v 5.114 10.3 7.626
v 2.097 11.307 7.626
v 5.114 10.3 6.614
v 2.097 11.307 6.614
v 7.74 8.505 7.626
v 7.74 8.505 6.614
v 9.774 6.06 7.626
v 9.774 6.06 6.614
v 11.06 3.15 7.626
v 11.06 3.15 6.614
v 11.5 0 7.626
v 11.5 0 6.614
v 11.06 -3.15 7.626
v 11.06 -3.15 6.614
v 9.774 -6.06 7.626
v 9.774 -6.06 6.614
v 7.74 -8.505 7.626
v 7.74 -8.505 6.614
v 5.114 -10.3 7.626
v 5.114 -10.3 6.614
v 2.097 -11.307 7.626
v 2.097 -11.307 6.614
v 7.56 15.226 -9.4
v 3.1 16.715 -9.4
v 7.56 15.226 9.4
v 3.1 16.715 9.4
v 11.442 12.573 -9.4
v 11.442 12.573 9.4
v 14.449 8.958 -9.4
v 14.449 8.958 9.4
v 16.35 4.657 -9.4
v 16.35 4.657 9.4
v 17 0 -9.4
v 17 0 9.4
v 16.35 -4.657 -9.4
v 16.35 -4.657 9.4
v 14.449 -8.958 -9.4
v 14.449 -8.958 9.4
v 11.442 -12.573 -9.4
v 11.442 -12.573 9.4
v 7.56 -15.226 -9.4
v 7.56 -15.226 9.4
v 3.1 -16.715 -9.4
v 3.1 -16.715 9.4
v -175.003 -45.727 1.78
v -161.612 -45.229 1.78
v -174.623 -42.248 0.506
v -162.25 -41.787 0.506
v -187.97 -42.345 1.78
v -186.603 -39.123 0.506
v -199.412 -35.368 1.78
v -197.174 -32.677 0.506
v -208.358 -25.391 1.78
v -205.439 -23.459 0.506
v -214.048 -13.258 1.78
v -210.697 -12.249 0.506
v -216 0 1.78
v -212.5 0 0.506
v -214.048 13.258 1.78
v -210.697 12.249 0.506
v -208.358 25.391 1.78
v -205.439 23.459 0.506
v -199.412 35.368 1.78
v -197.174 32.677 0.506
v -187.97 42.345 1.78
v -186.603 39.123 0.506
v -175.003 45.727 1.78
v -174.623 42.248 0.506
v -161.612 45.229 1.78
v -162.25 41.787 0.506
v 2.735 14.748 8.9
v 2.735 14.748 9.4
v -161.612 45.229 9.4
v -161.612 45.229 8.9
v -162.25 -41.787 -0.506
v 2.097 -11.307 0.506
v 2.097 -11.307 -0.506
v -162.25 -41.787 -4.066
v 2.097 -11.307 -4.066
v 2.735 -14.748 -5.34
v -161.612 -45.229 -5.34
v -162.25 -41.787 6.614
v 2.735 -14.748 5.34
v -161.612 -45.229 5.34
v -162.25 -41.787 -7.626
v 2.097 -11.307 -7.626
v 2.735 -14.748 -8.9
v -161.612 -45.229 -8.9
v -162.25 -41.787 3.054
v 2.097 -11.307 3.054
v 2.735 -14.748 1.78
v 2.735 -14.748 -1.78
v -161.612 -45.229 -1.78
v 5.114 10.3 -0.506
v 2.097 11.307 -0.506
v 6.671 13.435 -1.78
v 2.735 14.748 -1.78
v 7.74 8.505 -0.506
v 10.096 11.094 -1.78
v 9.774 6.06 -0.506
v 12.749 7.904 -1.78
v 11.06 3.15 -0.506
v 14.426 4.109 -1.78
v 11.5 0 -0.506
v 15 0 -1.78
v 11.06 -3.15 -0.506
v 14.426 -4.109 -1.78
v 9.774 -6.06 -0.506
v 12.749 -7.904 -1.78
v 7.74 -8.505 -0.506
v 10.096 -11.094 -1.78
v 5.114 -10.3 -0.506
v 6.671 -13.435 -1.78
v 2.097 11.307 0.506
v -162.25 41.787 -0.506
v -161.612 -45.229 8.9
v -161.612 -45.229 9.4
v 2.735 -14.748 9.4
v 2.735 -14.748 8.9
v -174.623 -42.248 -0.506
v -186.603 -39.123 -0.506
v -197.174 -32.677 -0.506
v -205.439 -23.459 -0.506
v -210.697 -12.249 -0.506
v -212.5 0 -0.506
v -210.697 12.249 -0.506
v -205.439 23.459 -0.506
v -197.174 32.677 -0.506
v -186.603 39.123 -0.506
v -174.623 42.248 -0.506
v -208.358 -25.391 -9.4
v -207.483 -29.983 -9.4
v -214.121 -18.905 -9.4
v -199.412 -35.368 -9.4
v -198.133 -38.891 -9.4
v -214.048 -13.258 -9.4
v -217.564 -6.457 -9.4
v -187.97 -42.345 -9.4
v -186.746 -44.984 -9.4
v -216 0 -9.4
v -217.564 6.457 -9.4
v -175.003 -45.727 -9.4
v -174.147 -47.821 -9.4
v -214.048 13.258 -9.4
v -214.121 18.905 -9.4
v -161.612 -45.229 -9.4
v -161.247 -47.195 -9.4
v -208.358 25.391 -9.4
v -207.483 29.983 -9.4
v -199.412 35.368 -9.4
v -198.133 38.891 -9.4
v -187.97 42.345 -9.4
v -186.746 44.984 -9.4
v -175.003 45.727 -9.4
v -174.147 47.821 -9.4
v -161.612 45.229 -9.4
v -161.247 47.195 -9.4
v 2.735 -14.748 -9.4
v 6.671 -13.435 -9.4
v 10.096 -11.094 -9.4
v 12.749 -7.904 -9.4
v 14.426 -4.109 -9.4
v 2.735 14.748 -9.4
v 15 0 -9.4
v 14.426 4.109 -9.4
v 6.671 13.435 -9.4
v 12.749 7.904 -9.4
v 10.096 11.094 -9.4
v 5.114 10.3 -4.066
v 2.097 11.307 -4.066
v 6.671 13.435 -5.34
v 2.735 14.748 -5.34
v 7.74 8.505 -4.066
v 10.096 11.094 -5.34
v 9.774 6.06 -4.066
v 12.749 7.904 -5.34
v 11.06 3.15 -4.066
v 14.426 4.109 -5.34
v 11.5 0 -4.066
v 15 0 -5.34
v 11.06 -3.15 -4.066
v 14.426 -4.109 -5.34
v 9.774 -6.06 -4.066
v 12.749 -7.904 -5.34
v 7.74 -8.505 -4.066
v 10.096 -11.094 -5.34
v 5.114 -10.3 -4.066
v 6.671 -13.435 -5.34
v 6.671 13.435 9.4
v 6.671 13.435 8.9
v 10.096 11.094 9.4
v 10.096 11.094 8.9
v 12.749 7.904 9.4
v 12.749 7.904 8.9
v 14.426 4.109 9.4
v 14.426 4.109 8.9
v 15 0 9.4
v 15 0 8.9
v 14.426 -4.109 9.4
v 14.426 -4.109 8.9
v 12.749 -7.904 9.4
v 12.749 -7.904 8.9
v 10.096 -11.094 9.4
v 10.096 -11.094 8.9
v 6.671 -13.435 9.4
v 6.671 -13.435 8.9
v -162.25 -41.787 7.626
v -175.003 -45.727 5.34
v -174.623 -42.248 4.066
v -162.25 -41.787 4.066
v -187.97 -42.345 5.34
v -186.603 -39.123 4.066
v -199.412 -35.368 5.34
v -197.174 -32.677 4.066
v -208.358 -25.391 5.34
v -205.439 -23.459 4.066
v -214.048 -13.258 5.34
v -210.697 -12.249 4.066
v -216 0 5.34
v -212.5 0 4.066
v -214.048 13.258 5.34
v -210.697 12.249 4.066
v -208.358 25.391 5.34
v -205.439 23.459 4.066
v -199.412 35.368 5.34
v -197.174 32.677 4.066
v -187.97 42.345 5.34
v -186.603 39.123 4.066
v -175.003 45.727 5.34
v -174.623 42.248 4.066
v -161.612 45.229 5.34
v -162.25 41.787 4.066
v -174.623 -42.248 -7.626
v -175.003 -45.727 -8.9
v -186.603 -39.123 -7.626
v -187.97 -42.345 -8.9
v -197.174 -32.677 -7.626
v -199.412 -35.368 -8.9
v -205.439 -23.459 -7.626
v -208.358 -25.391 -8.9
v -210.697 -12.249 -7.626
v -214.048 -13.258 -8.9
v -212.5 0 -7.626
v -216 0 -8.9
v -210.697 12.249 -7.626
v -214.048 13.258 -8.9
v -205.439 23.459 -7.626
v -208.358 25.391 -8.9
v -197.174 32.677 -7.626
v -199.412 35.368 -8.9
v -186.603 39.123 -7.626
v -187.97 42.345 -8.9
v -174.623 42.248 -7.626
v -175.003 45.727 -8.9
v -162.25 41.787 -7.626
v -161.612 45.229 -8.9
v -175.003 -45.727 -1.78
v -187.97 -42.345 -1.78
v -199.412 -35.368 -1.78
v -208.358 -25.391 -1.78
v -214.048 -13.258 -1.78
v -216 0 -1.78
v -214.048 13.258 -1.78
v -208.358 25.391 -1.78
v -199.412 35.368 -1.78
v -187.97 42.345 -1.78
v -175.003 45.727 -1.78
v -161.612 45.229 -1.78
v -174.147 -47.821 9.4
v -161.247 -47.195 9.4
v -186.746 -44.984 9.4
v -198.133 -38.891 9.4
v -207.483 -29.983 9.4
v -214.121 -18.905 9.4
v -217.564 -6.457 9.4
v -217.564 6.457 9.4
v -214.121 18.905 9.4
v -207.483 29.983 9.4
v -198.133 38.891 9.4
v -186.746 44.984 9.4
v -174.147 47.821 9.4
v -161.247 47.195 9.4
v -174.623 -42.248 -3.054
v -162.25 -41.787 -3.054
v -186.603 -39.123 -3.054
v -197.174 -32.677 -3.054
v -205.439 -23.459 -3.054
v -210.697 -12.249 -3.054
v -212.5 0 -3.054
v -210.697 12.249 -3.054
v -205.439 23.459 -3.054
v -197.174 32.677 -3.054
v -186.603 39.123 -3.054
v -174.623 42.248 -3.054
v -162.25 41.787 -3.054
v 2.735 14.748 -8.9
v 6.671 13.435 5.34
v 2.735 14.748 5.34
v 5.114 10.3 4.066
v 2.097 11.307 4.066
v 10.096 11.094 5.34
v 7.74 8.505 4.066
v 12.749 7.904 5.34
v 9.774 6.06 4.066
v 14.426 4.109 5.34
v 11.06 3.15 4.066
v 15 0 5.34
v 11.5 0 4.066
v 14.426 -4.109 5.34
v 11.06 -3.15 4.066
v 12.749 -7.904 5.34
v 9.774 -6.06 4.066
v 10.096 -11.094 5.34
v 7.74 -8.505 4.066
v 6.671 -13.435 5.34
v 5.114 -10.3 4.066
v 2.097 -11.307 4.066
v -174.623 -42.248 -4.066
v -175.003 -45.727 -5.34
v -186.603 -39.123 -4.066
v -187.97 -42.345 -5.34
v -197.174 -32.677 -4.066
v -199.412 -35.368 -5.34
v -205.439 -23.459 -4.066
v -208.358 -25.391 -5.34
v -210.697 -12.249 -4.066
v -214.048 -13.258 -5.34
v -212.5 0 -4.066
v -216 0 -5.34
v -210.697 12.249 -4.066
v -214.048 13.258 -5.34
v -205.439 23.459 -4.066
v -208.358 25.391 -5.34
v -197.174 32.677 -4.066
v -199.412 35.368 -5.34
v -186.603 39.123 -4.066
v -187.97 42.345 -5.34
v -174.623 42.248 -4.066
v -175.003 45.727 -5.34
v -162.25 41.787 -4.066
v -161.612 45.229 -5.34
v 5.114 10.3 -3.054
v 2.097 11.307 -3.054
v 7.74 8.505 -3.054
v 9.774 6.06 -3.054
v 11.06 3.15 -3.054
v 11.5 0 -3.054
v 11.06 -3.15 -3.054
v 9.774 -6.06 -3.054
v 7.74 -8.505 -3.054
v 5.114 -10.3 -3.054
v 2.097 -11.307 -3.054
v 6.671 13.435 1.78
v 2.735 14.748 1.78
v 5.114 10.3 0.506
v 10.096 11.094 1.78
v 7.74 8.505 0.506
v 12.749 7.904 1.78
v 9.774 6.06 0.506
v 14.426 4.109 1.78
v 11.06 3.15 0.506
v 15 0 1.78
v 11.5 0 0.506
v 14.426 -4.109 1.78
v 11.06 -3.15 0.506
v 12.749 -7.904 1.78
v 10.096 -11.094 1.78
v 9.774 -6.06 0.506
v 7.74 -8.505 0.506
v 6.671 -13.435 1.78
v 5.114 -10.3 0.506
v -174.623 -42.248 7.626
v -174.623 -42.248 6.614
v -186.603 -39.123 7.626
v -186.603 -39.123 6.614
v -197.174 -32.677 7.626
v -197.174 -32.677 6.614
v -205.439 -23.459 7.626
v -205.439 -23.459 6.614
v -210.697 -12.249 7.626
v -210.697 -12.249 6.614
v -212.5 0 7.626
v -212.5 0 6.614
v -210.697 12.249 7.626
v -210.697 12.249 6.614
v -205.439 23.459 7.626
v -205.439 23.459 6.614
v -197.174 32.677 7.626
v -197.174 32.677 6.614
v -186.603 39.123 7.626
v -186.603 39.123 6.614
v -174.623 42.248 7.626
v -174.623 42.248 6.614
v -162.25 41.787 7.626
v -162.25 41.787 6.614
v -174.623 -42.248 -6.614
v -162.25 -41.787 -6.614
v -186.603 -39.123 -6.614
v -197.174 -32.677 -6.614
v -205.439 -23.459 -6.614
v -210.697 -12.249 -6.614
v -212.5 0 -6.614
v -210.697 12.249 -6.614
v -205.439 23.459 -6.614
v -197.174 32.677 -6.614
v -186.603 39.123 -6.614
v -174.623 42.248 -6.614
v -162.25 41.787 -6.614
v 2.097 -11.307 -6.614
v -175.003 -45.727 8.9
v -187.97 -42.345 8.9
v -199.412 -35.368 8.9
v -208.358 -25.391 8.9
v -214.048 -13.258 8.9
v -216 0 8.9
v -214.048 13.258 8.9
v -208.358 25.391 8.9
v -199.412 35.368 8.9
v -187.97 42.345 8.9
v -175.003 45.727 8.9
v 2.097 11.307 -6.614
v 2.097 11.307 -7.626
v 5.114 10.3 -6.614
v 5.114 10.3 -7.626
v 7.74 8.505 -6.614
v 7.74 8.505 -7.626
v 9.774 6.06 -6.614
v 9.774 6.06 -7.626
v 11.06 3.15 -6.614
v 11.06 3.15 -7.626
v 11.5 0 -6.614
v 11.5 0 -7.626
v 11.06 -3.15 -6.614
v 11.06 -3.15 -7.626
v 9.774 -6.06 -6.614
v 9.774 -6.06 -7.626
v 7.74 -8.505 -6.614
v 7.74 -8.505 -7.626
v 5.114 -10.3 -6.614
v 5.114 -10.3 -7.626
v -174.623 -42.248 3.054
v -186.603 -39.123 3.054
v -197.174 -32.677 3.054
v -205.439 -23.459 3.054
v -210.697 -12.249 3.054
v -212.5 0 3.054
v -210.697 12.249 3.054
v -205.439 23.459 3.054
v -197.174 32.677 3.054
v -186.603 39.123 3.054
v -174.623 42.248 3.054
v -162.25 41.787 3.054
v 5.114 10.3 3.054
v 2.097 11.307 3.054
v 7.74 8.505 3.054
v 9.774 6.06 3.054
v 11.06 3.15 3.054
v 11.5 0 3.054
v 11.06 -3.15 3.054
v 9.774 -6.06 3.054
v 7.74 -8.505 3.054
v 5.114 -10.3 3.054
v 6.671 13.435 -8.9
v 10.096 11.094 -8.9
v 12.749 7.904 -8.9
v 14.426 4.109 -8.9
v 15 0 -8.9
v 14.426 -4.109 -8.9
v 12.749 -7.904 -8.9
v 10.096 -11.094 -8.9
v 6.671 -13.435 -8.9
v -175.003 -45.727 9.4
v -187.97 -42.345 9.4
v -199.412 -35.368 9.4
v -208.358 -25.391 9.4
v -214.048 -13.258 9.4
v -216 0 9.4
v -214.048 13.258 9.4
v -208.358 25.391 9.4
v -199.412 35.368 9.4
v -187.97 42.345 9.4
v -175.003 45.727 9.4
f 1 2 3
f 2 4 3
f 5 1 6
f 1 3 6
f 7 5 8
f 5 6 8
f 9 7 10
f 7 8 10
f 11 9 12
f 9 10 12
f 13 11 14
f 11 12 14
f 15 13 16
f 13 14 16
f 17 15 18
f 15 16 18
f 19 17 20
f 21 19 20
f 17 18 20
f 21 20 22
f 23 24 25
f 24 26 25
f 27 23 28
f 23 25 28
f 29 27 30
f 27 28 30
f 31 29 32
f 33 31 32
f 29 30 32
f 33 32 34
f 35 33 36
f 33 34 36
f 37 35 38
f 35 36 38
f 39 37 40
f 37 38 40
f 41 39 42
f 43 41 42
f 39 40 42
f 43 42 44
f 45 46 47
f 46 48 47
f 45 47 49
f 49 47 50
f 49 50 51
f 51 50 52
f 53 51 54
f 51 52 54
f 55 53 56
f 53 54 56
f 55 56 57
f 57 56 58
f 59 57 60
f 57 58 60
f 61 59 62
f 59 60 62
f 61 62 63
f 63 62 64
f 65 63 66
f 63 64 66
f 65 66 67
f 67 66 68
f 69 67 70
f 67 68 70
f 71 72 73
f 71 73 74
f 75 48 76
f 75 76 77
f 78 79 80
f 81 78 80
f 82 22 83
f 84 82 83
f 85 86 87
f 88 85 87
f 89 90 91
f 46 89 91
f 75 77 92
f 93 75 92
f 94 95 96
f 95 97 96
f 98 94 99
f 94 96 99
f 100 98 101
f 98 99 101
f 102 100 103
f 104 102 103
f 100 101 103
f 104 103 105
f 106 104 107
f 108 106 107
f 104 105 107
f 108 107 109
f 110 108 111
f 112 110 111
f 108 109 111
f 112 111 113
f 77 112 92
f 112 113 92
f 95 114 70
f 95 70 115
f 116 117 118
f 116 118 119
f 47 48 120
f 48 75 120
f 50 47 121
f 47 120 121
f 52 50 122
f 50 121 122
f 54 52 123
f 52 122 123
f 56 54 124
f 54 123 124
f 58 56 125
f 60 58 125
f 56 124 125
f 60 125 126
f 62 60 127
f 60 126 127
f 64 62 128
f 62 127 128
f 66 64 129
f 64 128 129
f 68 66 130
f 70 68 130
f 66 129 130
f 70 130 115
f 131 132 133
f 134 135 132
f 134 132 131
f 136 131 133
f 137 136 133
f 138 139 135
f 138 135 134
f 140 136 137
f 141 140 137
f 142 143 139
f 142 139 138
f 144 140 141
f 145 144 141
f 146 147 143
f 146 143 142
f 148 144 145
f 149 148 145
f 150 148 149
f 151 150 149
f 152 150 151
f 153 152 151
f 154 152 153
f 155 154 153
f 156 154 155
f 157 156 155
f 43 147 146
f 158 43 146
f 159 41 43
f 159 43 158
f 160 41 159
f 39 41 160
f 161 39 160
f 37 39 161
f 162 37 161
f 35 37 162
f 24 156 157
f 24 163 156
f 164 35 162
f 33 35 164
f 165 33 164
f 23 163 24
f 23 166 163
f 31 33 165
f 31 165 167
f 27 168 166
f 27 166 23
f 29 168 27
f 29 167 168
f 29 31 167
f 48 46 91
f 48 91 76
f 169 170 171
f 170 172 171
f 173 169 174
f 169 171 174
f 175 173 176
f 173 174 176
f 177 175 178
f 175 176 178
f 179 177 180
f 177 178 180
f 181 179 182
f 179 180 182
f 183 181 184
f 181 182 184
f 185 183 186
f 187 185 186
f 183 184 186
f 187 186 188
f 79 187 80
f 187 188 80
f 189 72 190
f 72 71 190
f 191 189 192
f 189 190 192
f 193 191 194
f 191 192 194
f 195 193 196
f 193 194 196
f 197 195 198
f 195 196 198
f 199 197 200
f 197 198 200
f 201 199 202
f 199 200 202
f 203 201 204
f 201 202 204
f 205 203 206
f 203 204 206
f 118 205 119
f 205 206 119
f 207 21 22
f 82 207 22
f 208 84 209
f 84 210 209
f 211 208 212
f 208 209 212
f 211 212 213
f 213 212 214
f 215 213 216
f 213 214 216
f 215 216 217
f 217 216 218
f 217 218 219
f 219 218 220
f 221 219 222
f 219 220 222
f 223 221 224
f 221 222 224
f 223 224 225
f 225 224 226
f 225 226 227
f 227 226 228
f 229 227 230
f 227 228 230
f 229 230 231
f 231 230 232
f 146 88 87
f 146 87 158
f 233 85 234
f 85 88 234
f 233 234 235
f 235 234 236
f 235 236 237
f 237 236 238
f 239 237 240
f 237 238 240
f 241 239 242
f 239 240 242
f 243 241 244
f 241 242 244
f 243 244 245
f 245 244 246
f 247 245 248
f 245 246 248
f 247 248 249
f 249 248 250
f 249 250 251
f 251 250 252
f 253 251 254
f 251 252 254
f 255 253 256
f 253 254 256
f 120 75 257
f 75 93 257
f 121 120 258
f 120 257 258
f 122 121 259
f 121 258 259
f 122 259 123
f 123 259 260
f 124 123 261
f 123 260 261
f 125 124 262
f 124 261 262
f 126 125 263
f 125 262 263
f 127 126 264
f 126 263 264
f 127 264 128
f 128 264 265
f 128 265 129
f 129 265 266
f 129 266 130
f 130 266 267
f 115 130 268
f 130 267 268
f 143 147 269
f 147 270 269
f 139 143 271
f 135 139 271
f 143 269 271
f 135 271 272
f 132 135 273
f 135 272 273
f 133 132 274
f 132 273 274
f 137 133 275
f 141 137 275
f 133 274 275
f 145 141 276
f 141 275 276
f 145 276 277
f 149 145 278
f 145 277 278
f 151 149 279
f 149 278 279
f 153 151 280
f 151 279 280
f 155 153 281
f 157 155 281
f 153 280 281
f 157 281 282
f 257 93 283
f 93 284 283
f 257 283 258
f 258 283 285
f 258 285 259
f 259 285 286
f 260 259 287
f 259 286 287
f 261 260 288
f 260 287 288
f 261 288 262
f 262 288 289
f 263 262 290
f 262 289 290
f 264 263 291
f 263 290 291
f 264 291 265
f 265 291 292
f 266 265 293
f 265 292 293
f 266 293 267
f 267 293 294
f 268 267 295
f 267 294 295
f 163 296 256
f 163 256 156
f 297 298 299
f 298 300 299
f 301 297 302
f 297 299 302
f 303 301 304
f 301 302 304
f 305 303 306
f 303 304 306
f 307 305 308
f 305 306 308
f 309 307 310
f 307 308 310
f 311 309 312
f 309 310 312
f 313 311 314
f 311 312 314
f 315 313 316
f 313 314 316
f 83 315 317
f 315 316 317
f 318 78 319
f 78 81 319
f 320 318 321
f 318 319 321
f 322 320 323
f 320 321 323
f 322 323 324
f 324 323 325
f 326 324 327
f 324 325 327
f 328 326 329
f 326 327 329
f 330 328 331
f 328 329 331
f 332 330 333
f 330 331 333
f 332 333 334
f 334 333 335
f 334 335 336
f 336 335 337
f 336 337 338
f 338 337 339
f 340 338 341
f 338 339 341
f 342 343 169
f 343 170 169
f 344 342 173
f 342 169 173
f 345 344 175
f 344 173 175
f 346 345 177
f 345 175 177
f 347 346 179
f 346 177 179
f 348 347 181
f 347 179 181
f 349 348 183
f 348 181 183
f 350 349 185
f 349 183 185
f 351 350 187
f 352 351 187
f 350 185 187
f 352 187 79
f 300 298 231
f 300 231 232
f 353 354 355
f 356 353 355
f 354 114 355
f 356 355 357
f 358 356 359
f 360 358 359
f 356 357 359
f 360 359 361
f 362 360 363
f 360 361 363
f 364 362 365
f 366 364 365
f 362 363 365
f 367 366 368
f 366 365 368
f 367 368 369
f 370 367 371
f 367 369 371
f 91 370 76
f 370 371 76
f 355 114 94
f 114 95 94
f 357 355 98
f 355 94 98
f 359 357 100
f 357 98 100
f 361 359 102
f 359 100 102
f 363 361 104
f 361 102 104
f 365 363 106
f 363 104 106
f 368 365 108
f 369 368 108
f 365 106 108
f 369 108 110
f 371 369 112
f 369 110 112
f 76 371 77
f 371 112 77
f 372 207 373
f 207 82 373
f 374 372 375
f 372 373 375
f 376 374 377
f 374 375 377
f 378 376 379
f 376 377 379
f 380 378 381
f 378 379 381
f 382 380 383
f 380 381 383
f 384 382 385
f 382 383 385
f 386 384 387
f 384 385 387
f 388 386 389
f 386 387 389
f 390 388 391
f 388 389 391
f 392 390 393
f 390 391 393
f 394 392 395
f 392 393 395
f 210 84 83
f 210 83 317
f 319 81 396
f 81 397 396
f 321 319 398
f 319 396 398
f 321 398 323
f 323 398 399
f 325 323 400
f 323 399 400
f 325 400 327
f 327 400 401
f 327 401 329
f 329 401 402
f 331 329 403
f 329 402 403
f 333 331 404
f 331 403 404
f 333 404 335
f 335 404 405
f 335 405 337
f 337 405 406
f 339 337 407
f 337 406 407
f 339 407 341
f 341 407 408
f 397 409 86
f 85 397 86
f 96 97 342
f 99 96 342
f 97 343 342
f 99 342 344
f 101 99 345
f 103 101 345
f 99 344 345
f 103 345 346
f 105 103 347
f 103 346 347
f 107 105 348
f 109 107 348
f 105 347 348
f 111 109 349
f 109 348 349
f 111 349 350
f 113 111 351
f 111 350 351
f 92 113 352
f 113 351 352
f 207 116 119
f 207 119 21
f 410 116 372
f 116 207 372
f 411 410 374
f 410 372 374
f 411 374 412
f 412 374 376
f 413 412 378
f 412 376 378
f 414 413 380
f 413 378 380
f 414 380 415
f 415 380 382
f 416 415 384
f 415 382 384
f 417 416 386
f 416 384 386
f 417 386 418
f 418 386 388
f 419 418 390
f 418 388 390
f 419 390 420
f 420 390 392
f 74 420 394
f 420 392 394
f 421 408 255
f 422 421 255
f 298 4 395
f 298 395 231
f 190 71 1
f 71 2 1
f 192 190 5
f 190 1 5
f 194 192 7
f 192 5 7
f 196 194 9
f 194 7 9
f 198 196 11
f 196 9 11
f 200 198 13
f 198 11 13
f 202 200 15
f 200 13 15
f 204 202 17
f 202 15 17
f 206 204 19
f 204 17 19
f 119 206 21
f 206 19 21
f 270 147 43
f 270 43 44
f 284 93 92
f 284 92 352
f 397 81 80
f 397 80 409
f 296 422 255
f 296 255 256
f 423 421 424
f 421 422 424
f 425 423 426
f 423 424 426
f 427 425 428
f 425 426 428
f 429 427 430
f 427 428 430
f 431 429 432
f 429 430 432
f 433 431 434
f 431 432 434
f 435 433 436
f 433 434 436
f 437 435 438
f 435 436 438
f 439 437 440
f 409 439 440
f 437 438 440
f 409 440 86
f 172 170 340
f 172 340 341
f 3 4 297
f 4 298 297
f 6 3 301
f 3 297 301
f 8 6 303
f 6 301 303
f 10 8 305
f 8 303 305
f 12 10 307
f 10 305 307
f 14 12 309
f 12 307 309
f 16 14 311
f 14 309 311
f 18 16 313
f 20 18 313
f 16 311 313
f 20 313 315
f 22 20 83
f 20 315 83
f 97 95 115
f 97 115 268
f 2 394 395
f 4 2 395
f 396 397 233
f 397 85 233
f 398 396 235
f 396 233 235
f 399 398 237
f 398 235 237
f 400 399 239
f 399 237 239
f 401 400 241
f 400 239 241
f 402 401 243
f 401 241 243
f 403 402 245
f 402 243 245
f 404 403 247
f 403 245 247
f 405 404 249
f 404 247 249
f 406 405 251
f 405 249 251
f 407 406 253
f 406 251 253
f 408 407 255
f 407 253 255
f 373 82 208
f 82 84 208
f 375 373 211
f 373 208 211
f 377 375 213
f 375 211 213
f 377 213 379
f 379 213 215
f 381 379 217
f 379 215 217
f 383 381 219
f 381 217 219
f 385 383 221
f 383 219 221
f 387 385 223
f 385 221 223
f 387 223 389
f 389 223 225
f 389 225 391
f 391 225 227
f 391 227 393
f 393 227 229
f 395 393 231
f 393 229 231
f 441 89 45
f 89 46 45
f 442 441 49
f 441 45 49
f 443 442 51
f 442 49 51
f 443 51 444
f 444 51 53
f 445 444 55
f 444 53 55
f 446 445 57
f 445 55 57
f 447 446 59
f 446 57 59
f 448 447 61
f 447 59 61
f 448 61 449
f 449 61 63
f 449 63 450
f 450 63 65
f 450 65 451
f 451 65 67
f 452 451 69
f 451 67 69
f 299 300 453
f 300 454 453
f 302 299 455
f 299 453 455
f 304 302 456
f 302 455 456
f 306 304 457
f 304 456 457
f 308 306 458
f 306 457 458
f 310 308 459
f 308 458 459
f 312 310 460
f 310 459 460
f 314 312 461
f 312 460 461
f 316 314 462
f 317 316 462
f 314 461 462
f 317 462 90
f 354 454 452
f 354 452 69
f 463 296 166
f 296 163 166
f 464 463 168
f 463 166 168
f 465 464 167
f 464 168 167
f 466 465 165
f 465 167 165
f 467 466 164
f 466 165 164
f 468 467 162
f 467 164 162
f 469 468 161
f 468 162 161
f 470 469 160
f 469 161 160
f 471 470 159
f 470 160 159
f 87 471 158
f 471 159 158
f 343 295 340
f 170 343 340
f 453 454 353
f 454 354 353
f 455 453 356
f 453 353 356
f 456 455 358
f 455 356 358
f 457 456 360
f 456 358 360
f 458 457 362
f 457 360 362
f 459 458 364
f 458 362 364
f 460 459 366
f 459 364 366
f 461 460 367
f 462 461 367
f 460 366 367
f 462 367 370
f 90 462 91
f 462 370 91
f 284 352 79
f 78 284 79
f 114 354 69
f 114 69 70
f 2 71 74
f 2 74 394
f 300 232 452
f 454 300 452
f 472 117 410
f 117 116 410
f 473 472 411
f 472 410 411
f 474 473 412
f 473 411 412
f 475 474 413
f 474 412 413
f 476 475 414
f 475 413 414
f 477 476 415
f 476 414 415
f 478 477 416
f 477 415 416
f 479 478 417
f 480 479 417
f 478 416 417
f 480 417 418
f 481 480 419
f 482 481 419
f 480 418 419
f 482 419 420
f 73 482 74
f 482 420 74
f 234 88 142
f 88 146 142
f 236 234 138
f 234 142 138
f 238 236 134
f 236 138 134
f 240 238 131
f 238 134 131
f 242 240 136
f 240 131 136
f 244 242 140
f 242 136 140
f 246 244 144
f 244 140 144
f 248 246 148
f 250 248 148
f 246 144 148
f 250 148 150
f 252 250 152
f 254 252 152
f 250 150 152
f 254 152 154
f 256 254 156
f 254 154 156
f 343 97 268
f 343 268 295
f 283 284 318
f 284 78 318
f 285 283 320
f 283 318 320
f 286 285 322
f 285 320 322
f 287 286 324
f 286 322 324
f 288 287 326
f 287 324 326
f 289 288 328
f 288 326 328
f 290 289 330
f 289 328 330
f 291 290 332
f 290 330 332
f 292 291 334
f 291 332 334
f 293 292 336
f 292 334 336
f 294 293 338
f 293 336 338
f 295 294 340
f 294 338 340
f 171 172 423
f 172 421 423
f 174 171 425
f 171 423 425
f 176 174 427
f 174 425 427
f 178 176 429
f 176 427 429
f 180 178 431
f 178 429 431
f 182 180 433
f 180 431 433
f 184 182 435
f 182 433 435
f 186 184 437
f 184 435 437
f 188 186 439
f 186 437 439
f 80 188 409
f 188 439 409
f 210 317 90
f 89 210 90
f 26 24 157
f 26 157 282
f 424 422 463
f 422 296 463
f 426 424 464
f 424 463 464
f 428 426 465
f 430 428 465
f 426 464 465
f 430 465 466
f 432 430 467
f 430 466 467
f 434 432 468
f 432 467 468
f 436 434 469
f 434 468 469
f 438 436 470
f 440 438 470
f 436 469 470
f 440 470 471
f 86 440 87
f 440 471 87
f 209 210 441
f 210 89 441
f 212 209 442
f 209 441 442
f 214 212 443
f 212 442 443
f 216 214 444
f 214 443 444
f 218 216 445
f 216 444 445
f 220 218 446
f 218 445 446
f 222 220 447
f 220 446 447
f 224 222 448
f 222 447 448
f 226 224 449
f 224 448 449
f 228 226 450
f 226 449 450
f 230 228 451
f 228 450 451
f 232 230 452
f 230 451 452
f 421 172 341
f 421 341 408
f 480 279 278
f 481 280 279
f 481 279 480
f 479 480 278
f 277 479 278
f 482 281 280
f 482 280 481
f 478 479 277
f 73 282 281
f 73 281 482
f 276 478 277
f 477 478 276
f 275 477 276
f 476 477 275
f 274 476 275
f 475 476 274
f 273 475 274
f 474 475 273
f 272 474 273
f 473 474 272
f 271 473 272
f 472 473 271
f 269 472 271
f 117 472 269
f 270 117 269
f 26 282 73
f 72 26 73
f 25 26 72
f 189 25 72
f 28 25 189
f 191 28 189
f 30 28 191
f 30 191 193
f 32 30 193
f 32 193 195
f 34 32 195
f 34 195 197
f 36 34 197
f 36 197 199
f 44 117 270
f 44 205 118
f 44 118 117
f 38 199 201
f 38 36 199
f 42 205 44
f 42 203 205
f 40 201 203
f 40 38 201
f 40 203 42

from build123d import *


with BuildPart() as part:
    # По траектории1: sweep along a path in Эскиз1
    with BuildLine(Plane.XY) as sweep_1_path:
        Line((-161.247058824, 47.195190653), (3.1, 16.714963356))
        ThreePointArc((3.1, 16.714963356), (17, 0), (3.1, -16.714963356))
        Line((3.1, -16.714963356), (-161.247058824, -47.195190653))
        ThreePointArc((-161.247058824, -47.195190653), (-218, 0), (-161.247058824, 47.195190653))
    # Эскиз2 → По траектории1 (sweep)
    with BuildSketch(Plane(origin=(0, 0, 0), x_dir=(1, 0, 0), z_dir=(0, 1, 0))):
        Polygon((-212.5, 3.05389582), (-216, 1.78), (-212.5, 0.50610418), (-212.5, -0.50610418), (-216, -1.78), (-212.5, -3.05389582), (-212.5, -4.06610418), (-216, -5.34), (-212.5, -6.61389582), (-212.5, -7.62610418), (-216, -8.9), (-216, -9.4), (-218, -9.4), (-218, 9.4), (-216, 9.4), (-216, 8.9), (-212.5, 7.62610418), (-212.5, 6.61389582), (-216, 5.34), (-212.5, 4.06610418), align=None)
    sweep(path=sweep_1_path.line)


solid = part.part
